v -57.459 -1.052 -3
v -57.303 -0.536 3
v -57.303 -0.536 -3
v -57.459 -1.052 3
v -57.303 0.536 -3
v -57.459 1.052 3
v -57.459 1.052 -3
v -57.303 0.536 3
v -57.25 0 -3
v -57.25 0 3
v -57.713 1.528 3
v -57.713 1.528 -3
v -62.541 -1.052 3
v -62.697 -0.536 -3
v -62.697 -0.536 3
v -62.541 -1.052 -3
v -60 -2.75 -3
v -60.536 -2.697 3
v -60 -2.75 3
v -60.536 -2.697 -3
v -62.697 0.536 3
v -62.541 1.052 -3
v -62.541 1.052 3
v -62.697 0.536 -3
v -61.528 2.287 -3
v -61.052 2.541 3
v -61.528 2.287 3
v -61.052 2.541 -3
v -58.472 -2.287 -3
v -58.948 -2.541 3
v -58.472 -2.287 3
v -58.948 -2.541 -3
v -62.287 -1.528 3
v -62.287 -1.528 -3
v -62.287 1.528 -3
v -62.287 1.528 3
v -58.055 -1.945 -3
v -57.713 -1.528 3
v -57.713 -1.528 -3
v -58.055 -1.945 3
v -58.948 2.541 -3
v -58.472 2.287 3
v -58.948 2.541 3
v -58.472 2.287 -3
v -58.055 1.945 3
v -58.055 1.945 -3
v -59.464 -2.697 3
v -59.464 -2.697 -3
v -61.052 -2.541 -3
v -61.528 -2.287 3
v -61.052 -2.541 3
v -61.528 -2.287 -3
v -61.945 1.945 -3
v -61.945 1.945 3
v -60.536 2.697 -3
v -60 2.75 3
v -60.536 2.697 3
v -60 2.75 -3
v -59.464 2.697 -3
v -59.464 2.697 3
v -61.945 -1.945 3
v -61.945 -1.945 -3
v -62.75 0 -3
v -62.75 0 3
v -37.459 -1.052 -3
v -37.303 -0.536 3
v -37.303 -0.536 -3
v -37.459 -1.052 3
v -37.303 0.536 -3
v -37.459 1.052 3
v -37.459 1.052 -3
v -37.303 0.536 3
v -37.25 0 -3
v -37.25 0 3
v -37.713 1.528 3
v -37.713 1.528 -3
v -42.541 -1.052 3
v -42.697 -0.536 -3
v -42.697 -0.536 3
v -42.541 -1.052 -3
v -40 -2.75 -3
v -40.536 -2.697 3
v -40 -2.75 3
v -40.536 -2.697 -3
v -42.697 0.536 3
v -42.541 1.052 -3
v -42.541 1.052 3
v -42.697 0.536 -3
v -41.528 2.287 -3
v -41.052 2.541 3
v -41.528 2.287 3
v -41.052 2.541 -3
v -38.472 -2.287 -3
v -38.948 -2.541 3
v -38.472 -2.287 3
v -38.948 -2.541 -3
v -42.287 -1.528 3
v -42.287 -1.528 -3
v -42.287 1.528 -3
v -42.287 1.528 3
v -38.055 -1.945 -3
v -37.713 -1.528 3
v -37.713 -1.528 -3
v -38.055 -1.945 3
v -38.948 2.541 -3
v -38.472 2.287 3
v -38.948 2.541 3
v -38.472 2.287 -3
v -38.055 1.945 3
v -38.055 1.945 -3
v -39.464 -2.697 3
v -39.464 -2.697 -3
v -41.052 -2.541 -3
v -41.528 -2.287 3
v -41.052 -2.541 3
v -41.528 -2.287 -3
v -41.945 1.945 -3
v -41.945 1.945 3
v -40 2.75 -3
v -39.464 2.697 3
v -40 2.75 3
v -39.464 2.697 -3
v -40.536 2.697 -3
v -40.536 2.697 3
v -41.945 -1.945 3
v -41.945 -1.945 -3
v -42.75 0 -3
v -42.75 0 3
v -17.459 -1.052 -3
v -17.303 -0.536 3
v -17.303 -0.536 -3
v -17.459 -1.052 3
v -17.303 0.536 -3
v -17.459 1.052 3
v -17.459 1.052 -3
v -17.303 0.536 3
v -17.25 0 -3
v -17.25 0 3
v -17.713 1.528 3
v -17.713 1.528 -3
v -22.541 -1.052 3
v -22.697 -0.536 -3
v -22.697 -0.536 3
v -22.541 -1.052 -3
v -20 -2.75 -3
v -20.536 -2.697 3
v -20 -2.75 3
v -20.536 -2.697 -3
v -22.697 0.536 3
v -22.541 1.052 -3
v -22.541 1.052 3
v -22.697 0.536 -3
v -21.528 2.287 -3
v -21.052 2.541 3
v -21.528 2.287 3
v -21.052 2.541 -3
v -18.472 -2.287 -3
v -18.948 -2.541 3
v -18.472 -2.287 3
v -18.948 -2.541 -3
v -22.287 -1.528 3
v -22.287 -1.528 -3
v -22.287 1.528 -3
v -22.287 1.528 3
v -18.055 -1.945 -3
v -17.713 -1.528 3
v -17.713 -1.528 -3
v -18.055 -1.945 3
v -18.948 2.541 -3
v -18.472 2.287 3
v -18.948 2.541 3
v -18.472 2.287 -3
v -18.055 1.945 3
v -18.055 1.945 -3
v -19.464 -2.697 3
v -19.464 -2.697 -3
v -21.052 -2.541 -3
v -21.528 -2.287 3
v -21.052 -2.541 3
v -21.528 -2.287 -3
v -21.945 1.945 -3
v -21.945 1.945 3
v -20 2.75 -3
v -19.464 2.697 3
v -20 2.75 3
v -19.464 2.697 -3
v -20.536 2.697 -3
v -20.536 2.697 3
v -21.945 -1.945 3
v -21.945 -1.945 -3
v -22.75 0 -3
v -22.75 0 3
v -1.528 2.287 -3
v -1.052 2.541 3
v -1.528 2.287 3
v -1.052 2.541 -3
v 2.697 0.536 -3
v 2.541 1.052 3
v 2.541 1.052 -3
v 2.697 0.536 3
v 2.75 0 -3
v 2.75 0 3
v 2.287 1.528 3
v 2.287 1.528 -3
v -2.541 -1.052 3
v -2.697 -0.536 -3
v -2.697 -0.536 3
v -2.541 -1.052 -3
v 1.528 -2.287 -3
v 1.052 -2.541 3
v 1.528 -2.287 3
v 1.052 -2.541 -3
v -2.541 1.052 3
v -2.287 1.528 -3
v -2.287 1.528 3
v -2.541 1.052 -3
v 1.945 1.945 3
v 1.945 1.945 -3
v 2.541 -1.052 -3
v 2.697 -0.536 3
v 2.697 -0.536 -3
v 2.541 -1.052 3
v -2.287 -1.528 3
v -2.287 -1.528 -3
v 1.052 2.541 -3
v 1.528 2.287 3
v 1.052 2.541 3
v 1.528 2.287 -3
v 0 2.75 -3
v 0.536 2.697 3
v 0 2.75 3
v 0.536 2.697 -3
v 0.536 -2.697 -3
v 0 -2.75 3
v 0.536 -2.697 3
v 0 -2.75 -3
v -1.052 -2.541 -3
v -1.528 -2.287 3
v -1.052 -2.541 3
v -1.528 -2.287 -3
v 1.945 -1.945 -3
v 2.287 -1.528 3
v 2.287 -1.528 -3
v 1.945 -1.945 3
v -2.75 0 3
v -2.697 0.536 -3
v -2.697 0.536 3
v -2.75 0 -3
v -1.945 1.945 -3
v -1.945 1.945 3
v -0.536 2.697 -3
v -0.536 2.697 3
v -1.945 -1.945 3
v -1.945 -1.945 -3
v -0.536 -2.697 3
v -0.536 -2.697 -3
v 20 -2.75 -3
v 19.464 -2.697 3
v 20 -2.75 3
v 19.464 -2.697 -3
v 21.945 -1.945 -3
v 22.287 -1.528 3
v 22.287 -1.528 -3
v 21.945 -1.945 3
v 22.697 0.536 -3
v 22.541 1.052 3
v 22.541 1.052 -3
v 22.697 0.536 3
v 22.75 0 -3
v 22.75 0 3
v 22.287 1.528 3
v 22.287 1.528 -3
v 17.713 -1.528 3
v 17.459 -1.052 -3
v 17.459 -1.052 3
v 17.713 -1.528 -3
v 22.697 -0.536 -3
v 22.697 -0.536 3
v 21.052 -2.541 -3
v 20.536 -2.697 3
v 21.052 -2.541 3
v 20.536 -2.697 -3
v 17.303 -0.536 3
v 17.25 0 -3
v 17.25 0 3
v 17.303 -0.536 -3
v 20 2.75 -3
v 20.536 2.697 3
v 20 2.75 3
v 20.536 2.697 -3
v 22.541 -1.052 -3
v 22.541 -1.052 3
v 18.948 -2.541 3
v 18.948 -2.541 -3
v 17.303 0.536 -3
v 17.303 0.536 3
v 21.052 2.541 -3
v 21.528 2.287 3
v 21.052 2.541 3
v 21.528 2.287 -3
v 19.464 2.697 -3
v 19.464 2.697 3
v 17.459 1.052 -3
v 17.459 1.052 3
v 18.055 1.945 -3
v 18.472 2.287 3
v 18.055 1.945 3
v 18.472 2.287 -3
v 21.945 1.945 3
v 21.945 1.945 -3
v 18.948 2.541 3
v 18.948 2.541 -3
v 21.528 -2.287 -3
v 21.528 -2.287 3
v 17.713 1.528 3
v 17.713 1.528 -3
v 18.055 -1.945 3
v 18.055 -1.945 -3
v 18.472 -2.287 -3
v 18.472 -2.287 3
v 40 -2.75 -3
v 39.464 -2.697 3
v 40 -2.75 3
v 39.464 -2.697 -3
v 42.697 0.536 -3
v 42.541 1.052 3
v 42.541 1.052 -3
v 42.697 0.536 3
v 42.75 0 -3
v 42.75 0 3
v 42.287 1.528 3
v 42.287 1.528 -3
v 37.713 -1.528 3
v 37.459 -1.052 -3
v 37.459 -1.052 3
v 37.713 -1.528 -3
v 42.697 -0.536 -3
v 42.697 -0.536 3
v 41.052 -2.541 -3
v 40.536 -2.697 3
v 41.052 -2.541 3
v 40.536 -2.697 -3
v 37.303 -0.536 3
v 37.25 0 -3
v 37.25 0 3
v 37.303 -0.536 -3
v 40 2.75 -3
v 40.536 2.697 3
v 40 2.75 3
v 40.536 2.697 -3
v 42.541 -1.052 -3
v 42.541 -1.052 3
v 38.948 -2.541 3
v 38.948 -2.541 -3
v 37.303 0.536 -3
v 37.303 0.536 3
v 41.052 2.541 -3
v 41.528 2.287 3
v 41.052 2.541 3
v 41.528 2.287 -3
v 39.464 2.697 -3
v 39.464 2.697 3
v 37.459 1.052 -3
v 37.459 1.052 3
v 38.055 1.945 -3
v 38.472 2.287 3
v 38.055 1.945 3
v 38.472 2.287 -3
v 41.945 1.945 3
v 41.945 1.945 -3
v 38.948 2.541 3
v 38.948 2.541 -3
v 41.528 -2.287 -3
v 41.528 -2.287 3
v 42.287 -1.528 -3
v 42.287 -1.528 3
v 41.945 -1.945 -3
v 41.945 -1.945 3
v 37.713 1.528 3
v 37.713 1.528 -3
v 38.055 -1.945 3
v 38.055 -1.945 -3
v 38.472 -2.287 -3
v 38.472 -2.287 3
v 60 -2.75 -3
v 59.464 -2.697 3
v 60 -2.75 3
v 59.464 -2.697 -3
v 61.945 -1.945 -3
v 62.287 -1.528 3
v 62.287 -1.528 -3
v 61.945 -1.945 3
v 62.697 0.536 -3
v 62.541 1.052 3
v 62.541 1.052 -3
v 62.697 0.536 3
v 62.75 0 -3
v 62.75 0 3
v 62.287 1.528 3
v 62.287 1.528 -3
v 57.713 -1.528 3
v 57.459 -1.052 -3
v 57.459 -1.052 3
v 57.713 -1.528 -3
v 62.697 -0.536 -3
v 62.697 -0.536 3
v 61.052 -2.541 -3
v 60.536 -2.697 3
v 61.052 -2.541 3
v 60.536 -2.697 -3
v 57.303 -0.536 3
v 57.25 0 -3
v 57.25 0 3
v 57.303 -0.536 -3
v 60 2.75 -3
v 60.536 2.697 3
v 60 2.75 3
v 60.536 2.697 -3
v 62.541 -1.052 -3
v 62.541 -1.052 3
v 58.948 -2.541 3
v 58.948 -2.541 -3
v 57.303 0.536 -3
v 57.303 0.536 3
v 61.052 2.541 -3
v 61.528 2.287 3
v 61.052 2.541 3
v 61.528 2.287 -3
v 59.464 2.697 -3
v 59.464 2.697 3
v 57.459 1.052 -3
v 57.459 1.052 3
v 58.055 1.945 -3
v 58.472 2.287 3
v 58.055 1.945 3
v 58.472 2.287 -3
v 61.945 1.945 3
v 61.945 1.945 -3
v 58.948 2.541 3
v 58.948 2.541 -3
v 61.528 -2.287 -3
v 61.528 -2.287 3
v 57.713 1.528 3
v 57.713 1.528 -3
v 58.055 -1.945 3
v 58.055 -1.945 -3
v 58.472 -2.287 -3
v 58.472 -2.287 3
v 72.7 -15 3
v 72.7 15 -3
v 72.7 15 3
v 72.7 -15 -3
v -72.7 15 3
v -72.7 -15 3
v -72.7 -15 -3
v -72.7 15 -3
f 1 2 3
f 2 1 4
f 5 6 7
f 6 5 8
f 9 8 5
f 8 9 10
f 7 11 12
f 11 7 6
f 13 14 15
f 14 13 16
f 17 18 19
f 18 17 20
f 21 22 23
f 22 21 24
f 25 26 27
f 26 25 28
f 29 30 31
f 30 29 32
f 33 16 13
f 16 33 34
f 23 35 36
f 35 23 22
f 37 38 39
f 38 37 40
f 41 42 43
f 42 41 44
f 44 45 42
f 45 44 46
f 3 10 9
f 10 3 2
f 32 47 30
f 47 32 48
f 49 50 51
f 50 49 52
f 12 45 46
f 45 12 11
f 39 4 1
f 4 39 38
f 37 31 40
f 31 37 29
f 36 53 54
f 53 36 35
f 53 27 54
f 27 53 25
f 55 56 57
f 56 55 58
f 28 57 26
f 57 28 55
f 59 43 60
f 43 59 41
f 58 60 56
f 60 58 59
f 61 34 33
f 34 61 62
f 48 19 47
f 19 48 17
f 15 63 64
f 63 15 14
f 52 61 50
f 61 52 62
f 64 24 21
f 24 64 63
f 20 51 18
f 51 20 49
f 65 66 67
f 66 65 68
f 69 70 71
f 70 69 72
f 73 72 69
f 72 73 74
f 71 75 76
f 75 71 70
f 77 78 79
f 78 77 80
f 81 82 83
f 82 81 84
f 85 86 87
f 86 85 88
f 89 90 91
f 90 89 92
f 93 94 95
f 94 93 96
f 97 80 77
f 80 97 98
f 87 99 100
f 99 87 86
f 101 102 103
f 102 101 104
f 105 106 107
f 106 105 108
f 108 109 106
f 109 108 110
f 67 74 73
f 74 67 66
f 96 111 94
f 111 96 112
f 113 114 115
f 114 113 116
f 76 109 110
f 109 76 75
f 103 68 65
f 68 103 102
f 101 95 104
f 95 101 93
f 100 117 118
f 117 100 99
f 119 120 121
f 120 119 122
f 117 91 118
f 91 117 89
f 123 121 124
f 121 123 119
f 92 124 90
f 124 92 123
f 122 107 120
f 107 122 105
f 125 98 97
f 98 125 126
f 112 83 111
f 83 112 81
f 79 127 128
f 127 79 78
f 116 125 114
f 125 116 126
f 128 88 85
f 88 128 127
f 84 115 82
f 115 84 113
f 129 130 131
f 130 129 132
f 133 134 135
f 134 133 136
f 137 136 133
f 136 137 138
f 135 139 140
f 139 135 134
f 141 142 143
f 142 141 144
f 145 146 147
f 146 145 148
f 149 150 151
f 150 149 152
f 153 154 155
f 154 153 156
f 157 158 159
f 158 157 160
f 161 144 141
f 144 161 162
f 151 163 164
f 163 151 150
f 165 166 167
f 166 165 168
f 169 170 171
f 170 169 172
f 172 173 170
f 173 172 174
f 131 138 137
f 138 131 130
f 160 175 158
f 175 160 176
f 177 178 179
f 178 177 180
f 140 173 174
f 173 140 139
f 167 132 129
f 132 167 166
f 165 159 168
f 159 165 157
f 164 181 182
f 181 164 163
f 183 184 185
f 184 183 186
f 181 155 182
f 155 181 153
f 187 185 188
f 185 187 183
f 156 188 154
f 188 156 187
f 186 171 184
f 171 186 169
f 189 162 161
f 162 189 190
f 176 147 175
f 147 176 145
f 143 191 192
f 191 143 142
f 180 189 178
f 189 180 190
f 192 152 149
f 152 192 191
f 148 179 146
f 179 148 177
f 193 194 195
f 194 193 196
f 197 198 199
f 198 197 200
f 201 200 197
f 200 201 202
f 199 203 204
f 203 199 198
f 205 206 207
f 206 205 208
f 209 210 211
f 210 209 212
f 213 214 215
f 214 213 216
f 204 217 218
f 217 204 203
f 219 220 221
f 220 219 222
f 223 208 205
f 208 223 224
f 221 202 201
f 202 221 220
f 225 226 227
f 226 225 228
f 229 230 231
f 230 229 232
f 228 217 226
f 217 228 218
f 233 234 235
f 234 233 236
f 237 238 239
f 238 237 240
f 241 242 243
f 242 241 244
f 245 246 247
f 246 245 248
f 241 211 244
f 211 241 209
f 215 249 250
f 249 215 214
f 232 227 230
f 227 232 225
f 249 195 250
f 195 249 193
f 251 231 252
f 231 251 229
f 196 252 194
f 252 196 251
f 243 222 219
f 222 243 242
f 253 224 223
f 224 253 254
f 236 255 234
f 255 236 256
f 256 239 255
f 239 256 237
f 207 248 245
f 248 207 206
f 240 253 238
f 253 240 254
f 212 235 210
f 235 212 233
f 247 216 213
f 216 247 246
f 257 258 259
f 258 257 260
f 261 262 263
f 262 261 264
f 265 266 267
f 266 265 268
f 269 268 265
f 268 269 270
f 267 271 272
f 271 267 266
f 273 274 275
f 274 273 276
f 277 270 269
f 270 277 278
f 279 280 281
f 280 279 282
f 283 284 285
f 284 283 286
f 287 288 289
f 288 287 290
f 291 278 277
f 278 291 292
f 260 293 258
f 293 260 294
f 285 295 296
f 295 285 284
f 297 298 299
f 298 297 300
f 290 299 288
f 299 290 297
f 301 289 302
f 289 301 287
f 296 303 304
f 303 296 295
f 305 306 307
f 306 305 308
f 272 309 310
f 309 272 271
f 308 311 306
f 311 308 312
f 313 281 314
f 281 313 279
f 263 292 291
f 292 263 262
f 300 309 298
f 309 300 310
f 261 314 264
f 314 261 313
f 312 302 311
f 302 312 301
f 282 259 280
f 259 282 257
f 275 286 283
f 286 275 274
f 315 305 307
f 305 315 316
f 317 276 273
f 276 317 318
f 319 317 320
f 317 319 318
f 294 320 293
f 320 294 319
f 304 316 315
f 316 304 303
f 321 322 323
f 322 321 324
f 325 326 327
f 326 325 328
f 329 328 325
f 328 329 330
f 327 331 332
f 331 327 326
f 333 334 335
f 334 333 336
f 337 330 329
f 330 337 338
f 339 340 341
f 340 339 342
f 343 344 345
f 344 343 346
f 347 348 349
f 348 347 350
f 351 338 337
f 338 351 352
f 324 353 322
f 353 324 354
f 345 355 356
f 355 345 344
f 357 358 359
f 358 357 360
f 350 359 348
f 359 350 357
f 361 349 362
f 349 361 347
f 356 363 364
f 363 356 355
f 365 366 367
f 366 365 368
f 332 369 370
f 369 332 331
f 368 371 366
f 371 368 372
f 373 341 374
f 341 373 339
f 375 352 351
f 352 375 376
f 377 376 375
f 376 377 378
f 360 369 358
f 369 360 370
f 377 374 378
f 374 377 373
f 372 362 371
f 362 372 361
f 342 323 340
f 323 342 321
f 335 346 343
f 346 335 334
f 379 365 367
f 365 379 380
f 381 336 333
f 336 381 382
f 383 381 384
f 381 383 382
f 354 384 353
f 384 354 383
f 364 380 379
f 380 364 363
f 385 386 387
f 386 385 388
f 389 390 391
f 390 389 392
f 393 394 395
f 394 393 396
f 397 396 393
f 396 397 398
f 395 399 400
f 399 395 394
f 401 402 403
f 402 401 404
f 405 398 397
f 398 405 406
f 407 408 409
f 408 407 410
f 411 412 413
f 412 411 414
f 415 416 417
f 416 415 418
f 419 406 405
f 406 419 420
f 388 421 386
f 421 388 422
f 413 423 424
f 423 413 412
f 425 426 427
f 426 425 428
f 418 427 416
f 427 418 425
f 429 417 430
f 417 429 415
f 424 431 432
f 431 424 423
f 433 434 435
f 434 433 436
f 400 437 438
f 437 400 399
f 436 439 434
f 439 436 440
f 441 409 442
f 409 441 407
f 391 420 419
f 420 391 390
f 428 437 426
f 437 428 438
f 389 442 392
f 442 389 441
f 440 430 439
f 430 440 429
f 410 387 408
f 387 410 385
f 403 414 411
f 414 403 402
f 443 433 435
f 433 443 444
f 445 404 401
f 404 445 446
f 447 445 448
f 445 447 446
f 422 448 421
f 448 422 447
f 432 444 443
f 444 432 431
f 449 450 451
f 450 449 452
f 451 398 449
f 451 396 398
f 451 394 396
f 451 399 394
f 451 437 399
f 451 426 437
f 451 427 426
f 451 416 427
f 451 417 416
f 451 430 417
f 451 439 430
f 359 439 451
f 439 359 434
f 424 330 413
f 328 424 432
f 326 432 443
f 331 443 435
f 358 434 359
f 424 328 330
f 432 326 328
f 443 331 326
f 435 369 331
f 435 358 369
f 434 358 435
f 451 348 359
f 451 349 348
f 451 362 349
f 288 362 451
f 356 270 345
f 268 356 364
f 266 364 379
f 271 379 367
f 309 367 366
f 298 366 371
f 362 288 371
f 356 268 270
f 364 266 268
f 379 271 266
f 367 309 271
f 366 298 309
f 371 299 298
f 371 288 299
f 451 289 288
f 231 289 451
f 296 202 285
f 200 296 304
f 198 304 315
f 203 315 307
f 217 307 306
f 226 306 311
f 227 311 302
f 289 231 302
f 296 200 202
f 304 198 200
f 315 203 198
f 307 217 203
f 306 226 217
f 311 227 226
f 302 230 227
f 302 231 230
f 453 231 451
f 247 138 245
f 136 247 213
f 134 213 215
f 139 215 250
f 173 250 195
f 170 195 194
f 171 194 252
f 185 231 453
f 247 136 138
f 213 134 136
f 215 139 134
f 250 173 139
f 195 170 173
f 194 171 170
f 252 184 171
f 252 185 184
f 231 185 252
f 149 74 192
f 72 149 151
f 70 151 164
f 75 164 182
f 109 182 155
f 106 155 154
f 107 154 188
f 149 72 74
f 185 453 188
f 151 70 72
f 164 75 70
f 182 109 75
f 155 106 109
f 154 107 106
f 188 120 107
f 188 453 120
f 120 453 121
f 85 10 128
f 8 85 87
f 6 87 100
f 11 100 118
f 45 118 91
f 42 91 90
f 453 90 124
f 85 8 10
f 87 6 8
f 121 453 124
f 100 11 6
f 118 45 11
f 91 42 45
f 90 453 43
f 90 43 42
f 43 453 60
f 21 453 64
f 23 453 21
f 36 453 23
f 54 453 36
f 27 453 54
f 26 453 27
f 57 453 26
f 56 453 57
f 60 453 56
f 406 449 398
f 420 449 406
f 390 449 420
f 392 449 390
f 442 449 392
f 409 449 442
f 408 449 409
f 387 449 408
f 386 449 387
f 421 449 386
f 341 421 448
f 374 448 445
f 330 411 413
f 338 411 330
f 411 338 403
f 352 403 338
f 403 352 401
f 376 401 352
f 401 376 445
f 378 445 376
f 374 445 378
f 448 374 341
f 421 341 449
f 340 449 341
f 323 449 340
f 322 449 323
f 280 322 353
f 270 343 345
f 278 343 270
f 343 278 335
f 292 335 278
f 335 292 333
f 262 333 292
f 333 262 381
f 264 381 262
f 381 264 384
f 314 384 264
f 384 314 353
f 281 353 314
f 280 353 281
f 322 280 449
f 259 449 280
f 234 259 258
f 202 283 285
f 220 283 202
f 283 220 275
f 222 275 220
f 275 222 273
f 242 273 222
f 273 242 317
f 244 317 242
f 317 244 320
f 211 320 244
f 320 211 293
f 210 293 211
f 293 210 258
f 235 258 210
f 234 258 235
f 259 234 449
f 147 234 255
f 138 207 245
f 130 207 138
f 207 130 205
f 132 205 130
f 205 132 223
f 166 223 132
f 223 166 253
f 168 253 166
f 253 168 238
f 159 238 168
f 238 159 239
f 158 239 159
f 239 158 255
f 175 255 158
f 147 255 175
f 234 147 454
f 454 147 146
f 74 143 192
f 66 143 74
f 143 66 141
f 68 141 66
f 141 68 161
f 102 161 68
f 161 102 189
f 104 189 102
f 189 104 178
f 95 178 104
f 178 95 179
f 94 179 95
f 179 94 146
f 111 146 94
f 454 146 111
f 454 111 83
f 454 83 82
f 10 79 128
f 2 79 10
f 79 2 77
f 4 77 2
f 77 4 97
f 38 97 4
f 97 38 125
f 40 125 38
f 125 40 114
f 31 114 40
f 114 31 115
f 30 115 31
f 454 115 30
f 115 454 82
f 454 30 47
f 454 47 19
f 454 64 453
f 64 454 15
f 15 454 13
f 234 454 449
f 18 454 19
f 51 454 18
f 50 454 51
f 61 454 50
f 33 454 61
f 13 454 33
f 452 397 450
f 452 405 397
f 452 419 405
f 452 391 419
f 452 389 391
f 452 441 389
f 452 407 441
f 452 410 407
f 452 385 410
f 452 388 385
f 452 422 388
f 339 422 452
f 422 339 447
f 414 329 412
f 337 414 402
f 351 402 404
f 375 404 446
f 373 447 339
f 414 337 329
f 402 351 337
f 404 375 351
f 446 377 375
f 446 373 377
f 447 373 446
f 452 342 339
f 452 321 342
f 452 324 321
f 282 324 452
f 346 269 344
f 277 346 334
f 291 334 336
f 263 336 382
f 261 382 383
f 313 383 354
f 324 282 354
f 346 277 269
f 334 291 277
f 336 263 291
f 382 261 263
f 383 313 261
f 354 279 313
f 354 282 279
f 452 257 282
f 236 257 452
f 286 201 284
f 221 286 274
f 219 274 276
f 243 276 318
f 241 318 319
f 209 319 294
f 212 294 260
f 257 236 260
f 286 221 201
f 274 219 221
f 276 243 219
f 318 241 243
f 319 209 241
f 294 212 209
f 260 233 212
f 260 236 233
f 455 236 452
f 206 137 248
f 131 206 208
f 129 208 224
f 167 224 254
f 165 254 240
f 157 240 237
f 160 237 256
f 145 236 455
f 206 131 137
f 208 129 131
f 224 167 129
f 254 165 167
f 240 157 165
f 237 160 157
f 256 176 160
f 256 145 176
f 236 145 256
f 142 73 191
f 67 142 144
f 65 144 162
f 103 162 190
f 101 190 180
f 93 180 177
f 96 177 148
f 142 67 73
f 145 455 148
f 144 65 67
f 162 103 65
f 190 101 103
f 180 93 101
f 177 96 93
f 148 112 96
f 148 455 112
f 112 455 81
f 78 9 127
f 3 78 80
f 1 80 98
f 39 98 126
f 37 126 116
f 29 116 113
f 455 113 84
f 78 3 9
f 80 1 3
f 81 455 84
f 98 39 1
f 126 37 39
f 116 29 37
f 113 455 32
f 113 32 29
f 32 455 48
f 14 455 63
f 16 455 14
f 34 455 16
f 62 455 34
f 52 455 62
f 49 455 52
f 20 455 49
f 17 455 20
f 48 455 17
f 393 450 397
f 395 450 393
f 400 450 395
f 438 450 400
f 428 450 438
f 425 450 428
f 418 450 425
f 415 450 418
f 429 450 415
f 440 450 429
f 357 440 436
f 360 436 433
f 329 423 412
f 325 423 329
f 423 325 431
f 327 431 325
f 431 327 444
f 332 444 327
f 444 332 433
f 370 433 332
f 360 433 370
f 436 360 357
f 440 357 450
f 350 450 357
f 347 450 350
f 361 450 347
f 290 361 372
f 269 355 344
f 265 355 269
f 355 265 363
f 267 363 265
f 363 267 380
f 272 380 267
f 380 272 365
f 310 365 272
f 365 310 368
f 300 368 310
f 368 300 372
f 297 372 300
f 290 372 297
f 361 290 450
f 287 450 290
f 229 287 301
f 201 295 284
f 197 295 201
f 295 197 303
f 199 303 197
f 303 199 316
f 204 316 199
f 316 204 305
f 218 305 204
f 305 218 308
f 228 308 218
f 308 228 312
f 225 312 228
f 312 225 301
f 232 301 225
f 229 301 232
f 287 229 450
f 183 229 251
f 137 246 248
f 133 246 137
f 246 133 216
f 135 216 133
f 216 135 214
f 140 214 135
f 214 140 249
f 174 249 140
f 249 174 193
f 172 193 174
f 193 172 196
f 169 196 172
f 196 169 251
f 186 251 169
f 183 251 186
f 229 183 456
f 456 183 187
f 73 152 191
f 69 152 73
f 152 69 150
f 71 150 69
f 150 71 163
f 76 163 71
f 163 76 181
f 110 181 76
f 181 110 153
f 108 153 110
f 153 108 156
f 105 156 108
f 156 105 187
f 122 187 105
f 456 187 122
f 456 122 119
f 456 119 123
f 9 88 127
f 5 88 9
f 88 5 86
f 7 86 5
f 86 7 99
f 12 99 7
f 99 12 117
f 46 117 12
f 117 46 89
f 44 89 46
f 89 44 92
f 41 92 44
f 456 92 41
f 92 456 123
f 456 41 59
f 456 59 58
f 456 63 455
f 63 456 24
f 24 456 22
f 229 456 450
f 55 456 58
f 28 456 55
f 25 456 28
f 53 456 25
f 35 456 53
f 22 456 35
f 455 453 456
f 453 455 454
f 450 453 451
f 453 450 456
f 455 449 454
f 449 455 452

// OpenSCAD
$fn = 32;

// ----------------------------------------------------------------------
// Hole bar, 7 x Ø5.5
// row layout, 12.7 mm edge offset
// ----------------------------------------------------------------------

// --- parameters (mm) ---
bar_w = 30;    // bar width (Y)
bar_t = 6;     // bar thickness (Z)
holes = 7;     // holes per row
hole_d = 5.5;  // hole diameter
edge = 12.7;   // offset from the bar end to the first hole
pitch = 20;    // pitch between neighbouring holes

// --- derived feature positions (mm) ---
span = (holes - 1) * pitch;   // = 120   distance between the end holes
bar_l = span + 2 * edge;      // = 145.4   overall bar length
start_x = -bar_l / 2 + edge;  // = -60   X of the first hole
feature_centers = [
  [start_x + 0 * pitch, 0],
  [start_x + 1 * pitch, 0],
  [start_x + 2 * pitch, 0],
  [start_x + 3 * pitch, 0],
  [start_x + 4 * pitch, 0],
  [start_x + 5 * pitch, 0],
  [start_x + 6 * pitch, 0]
];   // hole centres of the first row

// bar with one row of holes, drilled from feature_centers
difference() {
  translate([-bar_l / 2, -bar_w / 2, -bar_t / 2]) cube([bar_l, bar_w, bar_t]);
  for (centre = feature_centers)
    translate([centre[0], centre[1], 0])
      cylinder(d = hole_d, h = bar_t + 2, center = true);
}
